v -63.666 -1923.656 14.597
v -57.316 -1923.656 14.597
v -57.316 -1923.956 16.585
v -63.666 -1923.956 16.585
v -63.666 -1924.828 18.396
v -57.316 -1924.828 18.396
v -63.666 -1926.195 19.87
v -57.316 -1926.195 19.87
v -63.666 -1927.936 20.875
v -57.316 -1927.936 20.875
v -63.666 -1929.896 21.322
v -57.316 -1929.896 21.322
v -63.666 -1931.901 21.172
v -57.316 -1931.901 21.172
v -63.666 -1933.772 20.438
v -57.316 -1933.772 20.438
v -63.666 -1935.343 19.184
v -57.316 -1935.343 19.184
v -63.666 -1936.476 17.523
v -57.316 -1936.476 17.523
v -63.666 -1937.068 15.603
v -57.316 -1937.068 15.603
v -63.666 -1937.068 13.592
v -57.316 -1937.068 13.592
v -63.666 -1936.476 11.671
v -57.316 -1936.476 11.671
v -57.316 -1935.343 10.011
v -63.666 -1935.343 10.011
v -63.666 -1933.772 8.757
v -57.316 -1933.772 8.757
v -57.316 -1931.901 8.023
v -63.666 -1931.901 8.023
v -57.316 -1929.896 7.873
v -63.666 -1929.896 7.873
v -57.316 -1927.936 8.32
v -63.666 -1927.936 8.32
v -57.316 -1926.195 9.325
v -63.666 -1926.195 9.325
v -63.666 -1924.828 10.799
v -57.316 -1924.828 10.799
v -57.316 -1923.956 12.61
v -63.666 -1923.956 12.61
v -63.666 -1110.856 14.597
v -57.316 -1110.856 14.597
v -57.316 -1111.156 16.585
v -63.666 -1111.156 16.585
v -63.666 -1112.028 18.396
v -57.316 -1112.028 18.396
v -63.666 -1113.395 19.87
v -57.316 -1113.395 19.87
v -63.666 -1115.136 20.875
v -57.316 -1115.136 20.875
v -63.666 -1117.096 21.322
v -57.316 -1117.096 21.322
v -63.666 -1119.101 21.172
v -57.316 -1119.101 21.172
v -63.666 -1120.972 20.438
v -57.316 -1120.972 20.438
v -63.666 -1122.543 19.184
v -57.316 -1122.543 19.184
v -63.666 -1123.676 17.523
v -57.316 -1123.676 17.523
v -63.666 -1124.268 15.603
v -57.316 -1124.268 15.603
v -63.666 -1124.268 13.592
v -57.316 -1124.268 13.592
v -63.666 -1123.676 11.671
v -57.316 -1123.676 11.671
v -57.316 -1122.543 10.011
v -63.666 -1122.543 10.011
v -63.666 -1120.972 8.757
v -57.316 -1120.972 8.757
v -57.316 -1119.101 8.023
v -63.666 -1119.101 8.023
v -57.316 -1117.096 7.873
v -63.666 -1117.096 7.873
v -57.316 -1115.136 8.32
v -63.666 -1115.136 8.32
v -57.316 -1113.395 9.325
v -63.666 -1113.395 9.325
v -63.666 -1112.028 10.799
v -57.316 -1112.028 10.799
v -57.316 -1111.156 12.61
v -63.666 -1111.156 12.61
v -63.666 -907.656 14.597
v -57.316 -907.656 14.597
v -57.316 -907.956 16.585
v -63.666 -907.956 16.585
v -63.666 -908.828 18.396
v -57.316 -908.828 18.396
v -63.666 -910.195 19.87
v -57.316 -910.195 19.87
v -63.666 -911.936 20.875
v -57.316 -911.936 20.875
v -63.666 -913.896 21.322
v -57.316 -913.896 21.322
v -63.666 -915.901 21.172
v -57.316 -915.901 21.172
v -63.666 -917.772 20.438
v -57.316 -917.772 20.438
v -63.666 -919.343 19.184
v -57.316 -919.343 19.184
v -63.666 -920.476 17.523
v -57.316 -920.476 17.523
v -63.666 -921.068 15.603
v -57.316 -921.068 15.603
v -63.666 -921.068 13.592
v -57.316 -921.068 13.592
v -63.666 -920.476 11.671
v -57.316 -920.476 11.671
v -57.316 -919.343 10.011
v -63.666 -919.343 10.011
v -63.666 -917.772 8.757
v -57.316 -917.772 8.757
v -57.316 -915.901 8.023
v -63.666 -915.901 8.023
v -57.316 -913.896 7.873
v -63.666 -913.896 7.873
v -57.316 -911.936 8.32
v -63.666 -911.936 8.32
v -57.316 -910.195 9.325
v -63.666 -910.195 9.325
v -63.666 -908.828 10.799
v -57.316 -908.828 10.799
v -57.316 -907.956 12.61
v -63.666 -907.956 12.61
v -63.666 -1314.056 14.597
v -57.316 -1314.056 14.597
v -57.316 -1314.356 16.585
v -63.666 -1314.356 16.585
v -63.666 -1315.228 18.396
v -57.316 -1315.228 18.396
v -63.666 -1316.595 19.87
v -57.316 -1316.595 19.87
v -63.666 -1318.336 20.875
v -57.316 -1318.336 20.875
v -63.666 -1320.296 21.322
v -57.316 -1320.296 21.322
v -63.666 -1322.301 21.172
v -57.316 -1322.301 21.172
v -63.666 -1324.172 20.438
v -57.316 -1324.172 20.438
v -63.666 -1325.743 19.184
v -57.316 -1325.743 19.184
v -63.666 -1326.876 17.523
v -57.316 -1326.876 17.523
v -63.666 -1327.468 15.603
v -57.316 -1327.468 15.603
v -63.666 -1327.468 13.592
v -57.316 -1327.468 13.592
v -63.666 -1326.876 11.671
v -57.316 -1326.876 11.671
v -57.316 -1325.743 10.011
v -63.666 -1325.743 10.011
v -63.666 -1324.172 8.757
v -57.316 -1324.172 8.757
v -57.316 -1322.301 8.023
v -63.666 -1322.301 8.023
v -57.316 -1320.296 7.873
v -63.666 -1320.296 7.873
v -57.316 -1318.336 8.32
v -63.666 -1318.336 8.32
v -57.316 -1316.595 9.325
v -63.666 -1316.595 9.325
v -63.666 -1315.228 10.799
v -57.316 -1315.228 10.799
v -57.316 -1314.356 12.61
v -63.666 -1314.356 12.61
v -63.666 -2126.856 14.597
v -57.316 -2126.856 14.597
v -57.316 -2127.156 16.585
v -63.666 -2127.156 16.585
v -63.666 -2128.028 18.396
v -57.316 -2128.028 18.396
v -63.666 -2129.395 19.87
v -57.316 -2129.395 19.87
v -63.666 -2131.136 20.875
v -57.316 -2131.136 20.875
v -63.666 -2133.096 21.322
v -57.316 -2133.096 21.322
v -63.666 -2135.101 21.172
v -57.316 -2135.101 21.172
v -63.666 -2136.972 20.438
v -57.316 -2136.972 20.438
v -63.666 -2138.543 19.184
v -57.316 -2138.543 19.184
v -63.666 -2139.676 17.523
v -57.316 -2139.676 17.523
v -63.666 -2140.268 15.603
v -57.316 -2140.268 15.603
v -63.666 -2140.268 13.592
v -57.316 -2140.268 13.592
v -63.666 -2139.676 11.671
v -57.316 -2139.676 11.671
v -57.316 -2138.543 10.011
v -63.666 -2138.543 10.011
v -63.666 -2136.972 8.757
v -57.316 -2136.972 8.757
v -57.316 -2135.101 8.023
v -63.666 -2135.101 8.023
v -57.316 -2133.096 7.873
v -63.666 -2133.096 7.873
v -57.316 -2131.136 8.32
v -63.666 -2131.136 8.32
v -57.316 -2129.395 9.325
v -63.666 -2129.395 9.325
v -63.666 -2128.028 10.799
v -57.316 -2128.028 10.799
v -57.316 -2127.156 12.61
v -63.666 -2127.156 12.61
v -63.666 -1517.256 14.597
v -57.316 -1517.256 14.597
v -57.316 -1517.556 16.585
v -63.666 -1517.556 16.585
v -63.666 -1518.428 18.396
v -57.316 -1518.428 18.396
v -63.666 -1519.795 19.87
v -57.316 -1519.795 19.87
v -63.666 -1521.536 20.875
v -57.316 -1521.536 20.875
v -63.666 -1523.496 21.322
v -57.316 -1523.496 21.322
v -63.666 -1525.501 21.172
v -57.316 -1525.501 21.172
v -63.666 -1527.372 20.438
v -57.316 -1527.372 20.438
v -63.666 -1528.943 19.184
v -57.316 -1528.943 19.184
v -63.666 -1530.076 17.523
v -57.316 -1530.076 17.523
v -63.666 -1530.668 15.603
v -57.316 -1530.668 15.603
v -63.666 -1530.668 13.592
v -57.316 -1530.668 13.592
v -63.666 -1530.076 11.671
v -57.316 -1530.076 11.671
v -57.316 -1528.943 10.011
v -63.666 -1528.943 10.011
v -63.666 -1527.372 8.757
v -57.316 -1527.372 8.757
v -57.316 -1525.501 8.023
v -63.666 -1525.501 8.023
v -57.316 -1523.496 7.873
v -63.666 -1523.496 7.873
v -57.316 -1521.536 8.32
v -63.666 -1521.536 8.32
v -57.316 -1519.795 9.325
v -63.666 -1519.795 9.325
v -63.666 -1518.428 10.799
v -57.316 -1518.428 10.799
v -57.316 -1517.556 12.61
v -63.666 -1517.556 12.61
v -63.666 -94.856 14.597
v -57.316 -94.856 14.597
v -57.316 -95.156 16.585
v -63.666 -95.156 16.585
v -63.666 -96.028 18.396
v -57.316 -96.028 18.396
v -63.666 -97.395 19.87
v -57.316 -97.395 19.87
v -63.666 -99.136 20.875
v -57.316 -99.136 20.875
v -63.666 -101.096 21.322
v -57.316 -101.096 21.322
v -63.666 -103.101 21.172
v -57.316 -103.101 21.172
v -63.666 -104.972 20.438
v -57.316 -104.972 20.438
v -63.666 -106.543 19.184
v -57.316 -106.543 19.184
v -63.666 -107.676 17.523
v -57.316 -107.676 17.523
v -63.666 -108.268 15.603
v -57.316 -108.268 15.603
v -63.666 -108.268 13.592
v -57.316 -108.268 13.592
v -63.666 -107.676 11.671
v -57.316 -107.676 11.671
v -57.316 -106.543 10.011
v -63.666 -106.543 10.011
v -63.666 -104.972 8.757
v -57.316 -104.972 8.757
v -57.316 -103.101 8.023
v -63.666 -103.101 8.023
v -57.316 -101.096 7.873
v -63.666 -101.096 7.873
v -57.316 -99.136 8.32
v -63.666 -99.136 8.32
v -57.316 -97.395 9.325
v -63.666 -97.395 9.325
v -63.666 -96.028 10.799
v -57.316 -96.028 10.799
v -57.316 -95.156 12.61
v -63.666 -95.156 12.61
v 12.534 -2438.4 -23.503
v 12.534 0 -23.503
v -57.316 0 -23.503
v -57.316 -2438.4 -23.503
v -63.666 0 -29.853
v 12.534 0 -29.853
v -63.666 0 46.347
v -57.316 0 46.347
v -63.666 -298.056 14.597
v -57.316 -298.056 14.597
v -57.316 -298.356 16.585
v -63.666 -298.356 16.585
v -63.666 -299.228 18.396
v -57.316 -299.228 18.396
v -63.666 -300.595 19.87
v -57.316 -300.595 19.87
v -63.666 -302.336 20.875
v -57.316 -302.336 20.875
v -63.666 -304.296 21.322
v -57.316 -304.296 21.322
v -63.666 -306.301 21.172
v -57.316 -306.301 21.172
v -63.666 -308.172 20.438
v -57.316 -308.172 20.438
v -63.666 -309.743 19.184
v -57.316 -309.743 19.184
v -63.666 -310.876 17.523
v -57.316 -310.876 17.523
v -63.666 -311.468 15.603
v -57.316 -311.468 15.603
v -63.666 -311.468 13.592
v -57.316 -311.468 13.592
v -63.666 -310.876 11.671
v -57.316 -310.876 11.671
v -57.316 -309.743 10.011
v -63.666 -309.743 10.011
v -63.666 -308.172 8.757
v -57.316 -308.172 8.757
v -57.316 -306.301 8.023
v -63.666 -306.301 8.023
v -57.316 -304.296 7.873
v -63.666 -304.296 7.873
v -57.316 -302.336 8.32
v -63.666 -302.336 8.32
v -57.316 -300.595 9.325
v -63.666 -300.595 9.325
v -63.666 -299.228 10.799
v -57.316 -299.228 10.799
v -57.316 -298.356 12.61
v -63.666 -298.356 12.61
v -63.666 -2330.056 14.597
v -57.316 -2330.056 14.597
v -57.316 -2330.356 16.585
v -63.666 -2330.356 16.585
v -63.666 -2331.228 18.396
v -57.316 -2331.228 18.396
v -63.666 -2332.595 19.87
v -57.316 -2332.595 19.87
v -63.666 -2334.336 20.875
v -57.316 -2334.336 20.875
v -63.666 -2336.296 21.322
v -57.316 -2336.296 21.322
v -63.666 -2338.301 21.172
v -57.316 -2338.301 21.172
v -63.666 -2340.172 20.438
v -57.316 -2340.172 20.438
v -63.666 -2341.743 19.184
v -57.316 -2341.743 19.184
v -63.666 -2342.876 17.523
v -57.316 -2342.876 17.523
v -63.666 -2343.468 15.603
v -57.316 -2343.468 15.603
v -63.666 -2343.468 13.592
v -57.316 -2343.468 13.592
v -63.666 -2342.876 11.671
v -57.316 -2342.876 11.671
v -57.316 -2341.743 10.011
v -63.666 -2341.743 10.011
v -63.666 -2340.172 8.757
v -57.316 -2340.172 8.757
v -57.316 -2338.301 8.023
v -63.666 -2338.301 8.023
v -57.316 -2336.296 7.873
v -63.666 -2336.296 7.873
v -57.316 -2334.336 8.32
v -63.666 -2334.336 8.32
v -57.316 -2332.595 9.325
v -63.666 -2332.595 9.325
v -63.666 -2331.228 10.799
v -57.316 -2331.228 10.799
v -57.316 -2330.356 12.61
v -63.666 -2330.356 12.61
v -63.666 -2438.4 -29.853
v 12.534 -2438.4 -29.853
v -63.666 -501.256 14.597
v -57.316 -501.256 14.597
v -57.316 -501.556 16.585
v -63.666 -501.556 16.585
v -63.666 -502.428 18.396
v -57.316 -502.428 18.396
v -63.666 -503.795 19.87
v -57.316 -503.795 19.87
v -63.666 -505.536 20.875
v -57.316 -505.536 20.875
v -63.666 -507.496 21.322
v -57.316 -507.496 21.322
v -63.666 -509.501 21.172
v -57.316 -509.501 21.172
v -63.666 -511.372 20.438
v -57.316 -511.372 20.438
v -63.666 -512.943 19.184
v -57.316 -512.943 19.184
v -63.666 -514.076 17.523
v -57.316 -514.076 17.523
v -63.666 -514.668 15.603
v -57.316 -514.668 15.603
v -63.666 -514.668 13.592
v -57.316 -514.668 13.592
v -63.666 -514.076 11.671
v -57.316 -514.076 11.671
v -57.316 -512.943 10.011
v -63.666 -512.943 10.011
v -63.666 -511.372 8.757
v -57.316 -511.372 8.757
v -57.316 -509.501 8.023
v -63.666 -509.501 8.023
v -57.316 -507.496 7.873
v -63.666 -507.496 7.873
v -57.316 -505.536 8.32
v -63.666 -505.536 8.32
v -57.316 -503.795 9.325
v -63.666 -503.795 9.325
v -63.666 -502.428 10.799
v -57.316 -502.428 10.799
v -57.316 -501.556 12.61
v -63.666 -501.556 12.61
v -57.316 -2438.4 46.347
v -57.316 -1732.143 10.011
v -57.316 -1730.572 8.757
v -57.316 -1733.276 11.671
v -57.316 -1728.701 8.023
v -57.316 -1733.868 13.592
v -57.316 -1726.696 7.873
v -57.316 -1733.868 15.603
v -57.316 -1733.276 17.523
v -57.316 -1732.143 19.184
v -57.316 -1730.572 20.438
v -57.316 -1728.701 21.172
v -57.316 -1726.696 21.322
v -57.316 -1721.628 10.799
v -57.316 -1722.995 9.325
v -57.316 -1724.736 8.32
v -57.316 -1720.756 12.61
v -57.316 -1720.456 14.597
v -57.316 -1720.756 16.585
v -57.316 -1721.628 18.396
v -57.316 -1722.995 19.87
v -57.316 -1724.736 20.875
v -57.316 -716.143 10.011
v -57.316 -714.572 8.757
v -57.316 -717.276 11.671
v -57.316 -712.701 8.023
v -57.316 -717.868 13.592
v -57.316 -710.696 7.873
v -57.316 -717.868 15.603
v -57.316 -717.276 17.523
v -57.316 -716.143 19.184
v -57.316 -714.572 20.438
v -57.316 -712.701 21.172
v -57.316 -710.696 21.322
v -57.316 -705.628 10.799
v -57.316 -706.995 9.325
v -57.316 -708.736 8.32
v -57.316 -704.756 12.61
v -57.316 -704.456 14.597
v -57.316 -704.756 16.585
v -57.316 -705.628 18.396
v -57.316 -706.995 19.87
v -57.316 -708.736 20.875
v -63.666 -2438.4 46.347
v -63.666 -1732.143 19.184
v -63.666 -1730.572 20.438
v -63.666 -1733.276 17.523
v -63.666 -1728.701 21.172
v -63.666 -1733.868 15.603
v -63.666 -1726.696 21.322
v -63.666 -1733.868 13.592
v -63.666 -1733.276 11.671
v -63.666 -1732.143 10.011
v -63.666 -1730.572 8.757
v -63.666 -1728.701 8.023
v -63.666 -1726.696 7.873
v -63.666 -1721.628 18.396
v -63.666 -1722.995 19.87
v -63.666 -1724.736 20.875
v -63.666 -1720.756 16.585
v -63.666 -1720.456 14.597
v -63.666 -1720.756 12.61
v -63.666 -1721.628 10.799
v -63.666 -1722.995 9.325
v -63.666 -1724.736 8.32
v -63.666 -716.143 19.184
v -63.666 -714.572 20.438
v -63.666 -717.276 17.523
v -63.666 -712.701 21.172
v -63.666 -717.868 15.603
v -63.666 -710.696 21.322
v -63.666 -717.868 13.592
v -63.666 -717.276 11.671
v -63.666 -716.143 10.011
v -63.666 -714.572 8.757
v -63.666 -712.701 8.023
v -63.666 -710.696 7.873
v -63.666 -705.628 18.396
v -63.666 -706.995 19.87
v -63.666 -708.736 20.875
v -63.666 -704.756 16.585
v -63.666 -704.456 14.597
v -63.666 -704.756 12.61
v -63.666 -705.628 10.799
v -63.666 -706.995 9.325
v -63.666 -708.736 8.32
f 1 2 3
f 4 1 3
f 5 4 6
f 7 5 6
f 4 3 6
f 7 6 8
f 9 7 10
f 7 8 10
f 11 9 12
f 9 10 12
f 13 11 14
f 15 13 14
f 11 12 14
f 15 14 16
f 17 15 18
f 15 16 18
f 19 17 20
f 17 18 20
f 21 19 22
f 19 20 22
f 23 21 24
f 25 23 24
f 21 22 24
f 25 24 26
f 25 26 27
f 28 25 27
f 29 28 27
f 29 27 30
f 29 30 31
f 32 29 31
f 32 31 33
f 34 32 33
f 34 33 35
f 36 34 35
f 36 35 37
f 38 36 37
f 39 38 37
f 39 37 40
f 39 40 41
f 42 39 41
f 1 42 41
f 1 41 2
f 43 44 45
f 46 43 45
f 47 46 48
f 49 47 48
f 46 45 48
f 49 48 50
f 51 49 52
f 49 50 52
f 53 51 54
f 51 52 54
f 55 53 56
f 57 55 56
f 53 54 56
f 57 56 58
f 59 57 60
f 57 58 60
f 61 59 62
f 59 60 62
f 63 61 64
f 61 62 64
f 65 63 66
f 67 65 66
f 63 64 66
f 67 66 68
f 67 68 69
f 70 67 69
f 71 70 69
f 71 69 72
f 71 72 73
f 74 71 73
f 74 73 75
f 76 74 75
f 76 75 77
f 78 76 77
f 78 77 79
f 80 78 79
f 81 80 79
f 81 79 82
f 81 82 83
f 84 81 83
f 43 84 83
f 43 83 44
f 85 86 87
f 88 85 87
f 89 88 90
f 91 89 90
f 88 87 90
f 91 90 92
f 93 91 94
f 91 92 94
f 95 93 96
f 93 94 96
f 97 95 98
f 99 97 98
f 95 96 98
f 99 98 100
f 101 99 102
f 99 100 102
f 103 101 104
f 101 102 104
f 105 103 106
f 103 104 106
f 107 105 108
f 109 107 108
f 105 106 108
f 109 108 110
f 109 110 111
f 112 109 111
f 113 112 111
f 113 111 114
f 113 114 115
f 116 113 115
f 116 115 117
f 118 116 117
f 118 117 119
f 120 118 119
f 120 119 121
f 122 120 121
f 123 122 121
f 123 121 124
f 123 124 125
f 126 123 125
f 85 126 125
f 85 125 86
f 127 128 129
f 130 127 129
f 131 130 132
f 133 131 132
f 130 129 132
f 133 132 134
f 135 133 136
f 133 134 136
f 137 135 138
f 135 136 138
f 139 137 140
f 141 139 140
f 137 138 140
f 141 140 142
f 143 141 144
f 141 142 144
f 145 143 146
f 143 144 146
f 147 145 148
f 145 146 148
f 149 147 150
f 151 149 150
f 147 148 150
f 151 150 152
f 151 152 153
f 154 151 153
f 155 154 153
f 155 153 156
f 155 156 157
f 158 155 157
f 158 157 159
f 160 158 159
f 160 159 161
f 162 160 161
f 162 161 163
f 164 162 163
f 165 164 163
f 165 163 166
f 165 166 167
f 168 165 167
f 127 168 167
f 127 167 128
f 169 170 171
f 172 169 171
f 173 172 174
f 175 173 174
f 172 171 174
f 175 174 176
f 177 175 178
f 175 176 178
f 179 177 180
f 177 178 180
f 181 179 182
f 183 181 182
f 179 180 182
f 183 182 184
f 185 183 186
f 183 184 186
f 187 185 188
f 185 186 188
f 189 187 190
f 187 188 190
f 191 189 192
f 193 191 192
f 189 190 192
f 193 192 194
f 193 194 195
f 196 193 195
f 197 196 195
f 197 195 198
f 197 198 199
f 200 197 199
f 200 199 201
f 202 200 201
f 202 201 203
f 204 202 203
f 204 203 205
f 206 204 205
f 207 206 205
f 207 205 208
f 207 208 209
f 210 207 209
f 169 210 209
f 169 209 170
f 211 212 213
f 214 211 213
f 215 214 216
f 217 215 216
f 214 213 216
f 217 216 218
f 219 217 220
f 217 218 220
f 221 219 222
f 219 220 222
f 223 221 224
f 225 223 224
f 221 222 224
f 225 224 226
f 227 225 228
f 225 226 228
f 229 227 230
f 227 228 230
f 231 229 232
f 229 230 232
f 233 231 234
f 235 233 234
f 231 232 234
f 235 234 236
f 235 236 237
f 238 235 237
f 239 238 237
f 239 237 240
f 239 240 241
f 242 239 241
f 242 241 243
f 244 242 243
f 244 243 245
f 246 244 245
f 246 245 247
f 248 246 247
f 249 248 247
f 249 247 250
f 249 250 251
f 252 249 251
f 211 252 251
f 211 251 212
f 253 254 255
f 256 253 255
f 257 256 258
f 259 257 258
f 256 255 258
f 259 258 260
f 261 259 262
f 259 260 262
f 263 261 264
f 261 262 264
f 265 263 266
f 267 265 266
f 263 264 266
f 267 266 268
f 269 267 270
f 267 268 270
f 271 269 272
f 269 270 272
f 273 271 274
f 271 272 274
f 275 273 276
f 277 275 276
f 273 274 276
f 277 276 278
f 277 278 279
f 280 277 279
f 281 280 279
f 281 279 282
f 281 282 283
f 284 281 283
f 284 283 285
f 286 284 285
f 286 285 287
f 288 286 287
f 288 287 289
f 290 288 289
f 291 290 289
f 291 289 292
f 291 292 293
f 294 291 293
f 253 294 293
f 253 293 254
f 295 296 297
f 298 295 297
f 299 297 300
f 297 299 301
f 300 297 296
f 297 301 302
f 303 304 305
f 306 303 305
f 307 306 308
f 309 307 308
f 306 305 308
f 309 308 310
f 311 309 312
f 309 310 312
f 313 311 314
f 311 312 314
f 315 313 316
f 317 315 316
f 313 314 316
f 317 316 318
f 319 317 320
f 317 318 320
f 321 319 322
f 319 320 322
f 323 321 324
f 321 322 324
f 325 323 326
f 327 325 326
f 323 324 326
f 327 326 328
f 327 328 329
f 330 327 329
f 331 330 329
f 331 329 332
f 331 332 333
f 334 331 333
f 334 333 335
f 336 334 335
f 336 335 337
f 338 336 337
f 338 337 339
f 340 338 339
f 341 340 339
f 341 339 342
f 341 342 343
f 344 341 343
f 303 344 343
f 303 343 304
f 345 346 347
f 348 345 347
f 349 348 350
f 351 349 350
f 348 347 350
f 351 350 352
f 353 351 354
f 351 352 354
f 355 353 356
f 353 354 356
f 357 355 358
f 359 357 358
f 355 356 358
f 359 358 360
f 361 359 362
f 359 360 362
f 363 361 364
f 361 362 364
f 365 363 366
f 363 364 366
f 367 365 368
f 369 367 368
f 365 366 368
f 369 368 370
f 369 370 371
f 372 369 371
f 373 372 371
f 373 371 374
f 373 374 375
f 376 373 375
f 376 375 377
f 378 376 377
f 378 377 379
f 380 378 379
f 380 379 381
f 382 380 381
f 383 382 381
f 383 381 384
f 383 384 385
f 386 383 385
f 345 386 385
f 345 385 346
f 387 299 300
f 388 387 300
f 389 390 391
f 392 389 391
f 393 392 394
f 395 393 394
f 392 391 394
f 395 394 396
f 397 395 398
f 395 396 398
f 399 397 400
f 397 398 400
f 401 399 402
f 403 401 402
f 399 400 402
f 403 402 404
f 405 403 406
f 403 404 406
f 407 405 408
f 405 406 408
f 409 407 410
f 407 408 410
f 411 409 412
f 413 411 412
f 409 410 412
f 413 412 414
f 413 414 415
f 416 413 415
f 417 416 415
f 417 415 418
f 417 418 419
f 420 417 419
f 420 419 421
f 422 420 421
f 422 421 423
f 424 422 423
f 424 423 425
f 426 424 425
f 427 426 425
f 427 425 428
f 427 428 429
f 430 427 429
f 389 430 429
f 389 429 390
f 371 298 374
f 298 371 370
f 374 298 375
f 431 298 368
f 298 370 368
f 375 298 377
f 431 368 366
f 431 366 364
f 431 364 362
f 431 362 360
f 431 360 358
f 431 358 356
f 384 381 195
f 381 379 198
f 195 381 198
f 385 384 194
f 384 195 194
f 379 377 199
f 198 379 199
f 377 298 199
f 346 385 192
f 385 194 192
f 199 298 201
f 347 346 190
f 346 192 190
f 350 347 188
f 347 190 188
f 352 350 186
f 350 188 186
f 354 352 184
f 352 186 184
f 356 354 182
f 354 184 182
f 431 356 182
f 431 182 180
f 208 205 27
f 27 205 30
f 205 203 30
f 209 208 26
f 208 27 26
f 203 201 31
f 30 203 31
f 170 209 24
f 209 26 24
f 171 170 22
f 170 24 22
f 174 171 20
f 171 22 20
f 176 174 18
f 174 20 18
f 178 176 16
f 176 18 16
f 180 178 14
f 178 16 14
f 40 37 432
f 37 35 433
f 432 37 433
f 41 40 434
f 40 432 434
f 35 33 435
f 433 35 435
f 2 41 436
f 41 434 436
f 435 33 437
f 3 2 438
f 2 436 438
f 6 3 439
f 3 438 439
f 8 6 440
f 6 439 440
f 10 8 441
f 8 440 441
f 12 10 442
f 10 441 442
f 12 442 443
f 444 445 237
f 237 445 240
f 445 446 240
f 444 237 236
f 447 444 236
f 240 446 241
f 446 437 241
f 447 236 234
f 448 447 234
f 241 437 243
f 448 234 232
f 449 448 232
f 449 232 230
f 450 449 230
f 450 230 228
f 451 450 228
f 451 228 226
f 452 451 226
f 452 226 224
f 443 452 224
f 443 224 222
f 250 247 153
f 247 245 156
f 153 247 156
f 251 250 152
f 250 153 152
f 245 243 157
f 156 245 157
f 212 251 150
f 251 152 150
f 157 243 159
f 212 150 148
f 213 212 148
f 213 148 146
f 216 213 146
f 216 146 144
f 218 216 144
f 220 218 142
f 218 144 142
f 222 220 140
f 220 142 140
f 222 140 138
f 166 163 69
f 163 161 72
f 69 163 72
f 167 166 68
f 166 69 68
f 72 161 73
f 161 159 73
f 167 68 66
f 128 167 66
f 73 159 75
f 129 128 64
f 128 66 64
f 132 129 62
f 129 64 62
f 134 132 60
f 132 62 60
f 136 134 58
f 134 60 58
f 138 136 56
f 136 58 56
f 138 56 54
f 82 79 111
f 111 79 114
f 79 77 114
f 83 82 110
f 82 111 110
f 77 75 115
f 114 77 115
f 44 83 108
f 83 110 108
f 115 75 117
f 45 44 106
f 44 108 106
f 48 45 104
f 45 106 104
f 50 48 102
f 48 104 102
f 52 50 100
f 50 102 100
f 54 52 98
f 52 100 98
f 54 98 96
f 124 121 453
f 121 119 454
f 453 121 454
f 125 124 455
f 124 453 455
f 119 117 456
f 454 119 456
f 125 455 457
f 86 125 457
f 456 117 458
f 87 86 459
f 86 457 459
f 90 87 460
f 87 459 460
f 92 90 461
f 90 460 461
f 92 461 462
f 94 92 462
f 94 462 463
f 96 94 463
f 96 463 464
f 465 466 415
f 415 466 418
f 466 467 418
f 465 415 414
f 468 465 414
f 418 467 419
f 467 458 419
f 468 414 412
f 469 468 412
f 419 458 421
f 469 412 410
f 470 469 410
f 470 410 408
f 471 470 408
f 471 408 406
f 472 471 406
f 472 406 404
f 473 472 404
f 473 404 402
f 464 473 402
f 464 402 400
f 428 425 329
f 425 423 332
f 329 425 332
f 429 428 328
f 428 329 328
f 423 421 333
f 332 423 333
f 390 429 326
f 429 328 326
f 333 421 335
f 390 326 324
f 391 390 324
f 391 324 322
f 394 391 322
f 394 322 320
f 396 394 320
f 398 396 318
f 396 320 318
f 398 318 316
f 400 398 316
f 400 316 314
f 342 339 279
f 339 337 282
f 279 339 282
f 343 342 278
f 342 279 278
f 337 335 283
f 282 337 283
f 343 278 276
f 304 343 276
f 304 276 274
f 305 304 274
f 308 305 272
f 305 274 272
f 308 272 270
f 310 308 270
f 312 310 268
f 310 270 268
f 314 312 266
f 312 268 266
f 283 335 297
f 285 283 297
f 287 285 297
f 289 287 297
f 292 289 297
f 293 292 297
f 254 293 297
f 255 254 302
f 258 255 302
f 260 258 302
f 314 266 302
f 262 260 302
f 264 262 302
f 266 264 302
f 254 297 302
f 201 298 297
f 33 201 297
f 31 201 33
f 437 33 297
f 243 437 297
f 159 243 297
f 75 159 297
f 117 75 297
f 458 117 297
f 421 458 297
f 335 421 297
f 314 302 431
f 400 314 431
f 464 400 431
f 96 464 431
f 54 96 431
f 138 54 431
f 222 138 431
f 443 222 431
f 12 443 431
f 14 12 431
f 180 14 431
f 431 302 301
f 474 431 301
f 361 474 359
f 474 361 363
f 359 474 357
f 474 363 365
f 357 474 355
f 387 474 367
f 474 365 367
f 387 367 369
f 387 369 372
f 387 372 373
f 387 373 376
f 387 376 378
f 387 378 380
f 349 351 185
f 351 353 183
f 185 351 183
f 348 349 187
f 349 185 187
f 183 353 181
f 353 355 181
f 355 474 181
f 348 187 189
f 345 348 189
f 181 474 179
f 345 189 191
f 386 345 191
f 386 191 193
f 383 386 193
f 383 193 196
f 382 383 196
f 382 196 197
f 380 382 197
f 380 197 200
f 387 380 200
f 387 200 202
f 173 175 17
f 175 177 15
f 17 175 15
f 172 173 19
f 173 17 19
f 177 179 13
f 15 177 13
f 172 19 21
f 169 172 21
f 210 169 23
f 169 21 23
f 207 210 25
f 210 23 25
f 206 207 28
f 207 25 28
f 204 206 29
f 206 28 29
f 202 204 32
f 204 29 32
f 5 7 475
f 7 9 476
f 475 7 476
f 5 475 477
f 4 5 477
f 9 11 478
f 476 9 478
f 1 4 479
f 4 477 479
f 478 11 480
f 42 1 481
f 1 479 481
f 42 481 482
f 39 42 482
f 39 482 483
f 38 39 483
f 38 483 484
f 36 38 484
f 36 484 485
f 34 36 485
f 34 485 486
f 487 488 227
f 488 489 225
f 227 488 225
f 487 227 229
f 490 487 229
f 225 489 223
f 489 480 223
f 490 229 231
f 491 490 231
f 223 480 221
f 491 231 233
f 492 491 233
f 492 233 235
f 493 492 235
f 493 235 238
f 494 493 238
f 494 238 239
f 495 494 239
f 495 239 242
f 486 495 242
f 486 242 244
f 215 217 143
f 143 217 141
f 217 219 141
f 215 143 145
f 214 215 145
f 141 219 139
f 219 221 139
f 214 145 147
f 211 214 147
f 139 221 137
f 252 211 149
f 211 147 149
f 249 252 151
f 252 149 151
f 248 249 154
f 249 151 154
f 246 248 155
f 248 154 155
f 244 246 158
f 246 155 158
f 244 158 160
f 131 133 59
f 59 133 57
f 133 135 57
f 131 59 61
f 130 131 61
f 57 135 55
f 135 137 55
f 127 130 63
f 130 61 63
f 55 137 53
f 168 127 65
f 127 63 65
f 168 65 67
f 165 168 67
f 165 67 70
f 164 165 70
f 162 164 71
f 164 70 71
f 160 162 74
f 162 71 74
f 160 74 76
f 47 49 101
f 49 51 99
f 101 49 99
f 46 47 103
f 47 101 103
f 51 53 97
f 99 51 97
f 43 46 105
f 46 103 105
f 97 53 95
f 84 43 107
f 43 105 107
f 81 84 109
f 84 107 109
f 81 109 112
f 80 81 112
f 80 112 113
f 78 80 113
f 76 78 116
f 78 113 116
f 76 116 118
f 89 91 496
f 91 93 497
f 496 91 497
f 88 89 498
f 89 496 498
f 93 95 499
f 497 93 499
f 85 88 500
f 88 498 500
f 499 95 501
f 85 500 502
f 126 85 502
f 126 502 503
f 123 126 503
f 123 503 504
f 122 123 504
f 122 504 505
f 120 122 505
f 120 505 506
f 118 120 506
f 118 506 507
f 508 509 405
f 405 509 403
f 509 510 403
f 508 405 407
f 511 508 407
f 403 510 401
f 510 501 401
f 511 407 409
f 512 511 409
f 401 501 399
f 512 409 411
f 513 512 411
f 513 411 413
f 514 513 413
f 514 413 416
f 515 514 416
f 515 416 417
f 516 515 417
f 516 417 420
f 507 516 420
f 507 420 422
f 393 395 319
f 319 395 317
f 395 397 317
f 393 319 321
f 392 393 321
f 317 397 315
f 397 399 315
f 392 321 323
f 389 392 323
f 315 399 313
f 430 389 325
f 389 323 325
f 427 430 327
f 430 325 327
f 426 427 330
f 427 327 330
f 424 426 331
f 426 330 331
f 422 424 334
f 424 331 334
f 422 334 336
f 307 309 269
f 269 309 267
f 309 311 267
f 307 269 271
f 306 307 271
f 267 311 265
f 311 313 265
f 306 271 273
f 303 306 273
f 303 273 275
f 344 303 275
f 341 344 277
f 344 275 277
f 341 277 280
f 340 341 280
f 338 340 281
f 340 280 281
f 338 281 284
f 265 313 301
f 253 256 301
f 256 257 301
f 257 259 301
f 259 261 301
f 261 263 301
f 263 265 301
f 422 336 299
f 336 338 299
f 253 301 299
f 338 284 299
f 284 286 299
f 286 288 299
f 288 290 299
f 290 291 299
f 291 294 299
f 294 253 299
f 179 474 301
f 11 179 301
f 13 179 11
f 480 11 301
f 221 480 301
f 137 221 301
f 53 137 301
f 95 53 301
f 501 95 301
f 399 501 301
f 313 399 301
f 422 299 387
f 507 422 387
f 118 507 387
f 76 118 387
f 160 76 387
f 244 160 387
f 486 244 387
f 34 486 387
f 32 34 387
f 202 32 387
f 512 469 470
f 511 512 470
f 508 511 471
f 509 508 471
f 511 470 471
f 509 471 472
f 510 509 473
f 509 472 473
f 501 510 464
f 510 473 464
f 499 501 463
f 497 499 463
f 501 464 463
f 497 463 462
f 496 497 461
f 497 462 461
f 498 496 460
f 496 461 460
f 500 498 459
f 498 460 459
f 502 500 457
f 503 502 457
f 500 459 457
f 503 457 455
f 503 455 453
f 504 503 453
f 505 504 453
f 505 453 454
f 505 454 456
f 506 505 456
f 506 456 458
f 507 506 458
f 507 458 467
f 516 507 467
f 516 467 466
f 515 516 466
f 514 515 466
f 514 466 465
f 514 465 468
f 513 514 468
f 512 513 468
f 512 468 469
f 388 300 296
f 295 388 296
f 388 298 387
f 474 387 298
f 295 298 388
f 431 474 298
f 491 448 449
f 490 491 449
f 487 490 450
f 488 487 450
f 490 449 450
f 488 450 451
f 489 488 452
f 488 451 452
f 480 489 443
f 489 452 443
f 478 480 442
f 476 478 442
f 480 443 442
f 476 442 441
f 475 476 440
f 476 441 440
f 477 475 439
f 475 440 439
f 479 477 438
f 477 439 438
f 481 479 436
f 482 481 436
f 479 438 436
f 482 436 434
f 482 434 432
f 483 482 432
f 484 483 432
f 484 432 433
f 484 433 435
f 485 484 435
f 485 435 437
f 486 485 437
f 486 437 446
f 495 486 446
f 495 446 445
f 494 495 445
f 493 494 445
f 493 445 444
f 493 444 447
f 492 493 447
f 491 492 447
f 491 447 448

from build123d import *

# Parameters (mm, degrees)
F1_DEPTH = 2438.4
F3_D     = 13.4874


with BuildPart() as f1:
    # F0 (on Front) → F1 (new body)
    with BuildSketch(Plane.XZ):
        Polygon((-57.316309, 46.347476), (-63.666309, 46.347476), (-63.666309, -29.852524), (12.533691, -29.852524), (12.533691, -23.502524), (-57.316309, -23.502524), align=None)
    extrude(amount=F1_DEPTH)

    # F3 (through all)
    with Locations(Plane(origin=(-63.666309, 0, 0), x_dir=(0, -1, 0), z_dir=(-1, 0, 0))):
        with Locations((2336.8, 14.597476), (2133.6, 14.597476), (1930.4, 14.597476), (1727.2, 14.597476), (1524, 14.597476), (1320.8, 14.597476), (1117.6, 14.597476), (914.4, 14.597476), (711.2, 14.597476), (508, 14.597476), (304.8, 14.597476), (101.6, 14.597476)):
            Hole(F3_D / 2)


solid = f1.part
